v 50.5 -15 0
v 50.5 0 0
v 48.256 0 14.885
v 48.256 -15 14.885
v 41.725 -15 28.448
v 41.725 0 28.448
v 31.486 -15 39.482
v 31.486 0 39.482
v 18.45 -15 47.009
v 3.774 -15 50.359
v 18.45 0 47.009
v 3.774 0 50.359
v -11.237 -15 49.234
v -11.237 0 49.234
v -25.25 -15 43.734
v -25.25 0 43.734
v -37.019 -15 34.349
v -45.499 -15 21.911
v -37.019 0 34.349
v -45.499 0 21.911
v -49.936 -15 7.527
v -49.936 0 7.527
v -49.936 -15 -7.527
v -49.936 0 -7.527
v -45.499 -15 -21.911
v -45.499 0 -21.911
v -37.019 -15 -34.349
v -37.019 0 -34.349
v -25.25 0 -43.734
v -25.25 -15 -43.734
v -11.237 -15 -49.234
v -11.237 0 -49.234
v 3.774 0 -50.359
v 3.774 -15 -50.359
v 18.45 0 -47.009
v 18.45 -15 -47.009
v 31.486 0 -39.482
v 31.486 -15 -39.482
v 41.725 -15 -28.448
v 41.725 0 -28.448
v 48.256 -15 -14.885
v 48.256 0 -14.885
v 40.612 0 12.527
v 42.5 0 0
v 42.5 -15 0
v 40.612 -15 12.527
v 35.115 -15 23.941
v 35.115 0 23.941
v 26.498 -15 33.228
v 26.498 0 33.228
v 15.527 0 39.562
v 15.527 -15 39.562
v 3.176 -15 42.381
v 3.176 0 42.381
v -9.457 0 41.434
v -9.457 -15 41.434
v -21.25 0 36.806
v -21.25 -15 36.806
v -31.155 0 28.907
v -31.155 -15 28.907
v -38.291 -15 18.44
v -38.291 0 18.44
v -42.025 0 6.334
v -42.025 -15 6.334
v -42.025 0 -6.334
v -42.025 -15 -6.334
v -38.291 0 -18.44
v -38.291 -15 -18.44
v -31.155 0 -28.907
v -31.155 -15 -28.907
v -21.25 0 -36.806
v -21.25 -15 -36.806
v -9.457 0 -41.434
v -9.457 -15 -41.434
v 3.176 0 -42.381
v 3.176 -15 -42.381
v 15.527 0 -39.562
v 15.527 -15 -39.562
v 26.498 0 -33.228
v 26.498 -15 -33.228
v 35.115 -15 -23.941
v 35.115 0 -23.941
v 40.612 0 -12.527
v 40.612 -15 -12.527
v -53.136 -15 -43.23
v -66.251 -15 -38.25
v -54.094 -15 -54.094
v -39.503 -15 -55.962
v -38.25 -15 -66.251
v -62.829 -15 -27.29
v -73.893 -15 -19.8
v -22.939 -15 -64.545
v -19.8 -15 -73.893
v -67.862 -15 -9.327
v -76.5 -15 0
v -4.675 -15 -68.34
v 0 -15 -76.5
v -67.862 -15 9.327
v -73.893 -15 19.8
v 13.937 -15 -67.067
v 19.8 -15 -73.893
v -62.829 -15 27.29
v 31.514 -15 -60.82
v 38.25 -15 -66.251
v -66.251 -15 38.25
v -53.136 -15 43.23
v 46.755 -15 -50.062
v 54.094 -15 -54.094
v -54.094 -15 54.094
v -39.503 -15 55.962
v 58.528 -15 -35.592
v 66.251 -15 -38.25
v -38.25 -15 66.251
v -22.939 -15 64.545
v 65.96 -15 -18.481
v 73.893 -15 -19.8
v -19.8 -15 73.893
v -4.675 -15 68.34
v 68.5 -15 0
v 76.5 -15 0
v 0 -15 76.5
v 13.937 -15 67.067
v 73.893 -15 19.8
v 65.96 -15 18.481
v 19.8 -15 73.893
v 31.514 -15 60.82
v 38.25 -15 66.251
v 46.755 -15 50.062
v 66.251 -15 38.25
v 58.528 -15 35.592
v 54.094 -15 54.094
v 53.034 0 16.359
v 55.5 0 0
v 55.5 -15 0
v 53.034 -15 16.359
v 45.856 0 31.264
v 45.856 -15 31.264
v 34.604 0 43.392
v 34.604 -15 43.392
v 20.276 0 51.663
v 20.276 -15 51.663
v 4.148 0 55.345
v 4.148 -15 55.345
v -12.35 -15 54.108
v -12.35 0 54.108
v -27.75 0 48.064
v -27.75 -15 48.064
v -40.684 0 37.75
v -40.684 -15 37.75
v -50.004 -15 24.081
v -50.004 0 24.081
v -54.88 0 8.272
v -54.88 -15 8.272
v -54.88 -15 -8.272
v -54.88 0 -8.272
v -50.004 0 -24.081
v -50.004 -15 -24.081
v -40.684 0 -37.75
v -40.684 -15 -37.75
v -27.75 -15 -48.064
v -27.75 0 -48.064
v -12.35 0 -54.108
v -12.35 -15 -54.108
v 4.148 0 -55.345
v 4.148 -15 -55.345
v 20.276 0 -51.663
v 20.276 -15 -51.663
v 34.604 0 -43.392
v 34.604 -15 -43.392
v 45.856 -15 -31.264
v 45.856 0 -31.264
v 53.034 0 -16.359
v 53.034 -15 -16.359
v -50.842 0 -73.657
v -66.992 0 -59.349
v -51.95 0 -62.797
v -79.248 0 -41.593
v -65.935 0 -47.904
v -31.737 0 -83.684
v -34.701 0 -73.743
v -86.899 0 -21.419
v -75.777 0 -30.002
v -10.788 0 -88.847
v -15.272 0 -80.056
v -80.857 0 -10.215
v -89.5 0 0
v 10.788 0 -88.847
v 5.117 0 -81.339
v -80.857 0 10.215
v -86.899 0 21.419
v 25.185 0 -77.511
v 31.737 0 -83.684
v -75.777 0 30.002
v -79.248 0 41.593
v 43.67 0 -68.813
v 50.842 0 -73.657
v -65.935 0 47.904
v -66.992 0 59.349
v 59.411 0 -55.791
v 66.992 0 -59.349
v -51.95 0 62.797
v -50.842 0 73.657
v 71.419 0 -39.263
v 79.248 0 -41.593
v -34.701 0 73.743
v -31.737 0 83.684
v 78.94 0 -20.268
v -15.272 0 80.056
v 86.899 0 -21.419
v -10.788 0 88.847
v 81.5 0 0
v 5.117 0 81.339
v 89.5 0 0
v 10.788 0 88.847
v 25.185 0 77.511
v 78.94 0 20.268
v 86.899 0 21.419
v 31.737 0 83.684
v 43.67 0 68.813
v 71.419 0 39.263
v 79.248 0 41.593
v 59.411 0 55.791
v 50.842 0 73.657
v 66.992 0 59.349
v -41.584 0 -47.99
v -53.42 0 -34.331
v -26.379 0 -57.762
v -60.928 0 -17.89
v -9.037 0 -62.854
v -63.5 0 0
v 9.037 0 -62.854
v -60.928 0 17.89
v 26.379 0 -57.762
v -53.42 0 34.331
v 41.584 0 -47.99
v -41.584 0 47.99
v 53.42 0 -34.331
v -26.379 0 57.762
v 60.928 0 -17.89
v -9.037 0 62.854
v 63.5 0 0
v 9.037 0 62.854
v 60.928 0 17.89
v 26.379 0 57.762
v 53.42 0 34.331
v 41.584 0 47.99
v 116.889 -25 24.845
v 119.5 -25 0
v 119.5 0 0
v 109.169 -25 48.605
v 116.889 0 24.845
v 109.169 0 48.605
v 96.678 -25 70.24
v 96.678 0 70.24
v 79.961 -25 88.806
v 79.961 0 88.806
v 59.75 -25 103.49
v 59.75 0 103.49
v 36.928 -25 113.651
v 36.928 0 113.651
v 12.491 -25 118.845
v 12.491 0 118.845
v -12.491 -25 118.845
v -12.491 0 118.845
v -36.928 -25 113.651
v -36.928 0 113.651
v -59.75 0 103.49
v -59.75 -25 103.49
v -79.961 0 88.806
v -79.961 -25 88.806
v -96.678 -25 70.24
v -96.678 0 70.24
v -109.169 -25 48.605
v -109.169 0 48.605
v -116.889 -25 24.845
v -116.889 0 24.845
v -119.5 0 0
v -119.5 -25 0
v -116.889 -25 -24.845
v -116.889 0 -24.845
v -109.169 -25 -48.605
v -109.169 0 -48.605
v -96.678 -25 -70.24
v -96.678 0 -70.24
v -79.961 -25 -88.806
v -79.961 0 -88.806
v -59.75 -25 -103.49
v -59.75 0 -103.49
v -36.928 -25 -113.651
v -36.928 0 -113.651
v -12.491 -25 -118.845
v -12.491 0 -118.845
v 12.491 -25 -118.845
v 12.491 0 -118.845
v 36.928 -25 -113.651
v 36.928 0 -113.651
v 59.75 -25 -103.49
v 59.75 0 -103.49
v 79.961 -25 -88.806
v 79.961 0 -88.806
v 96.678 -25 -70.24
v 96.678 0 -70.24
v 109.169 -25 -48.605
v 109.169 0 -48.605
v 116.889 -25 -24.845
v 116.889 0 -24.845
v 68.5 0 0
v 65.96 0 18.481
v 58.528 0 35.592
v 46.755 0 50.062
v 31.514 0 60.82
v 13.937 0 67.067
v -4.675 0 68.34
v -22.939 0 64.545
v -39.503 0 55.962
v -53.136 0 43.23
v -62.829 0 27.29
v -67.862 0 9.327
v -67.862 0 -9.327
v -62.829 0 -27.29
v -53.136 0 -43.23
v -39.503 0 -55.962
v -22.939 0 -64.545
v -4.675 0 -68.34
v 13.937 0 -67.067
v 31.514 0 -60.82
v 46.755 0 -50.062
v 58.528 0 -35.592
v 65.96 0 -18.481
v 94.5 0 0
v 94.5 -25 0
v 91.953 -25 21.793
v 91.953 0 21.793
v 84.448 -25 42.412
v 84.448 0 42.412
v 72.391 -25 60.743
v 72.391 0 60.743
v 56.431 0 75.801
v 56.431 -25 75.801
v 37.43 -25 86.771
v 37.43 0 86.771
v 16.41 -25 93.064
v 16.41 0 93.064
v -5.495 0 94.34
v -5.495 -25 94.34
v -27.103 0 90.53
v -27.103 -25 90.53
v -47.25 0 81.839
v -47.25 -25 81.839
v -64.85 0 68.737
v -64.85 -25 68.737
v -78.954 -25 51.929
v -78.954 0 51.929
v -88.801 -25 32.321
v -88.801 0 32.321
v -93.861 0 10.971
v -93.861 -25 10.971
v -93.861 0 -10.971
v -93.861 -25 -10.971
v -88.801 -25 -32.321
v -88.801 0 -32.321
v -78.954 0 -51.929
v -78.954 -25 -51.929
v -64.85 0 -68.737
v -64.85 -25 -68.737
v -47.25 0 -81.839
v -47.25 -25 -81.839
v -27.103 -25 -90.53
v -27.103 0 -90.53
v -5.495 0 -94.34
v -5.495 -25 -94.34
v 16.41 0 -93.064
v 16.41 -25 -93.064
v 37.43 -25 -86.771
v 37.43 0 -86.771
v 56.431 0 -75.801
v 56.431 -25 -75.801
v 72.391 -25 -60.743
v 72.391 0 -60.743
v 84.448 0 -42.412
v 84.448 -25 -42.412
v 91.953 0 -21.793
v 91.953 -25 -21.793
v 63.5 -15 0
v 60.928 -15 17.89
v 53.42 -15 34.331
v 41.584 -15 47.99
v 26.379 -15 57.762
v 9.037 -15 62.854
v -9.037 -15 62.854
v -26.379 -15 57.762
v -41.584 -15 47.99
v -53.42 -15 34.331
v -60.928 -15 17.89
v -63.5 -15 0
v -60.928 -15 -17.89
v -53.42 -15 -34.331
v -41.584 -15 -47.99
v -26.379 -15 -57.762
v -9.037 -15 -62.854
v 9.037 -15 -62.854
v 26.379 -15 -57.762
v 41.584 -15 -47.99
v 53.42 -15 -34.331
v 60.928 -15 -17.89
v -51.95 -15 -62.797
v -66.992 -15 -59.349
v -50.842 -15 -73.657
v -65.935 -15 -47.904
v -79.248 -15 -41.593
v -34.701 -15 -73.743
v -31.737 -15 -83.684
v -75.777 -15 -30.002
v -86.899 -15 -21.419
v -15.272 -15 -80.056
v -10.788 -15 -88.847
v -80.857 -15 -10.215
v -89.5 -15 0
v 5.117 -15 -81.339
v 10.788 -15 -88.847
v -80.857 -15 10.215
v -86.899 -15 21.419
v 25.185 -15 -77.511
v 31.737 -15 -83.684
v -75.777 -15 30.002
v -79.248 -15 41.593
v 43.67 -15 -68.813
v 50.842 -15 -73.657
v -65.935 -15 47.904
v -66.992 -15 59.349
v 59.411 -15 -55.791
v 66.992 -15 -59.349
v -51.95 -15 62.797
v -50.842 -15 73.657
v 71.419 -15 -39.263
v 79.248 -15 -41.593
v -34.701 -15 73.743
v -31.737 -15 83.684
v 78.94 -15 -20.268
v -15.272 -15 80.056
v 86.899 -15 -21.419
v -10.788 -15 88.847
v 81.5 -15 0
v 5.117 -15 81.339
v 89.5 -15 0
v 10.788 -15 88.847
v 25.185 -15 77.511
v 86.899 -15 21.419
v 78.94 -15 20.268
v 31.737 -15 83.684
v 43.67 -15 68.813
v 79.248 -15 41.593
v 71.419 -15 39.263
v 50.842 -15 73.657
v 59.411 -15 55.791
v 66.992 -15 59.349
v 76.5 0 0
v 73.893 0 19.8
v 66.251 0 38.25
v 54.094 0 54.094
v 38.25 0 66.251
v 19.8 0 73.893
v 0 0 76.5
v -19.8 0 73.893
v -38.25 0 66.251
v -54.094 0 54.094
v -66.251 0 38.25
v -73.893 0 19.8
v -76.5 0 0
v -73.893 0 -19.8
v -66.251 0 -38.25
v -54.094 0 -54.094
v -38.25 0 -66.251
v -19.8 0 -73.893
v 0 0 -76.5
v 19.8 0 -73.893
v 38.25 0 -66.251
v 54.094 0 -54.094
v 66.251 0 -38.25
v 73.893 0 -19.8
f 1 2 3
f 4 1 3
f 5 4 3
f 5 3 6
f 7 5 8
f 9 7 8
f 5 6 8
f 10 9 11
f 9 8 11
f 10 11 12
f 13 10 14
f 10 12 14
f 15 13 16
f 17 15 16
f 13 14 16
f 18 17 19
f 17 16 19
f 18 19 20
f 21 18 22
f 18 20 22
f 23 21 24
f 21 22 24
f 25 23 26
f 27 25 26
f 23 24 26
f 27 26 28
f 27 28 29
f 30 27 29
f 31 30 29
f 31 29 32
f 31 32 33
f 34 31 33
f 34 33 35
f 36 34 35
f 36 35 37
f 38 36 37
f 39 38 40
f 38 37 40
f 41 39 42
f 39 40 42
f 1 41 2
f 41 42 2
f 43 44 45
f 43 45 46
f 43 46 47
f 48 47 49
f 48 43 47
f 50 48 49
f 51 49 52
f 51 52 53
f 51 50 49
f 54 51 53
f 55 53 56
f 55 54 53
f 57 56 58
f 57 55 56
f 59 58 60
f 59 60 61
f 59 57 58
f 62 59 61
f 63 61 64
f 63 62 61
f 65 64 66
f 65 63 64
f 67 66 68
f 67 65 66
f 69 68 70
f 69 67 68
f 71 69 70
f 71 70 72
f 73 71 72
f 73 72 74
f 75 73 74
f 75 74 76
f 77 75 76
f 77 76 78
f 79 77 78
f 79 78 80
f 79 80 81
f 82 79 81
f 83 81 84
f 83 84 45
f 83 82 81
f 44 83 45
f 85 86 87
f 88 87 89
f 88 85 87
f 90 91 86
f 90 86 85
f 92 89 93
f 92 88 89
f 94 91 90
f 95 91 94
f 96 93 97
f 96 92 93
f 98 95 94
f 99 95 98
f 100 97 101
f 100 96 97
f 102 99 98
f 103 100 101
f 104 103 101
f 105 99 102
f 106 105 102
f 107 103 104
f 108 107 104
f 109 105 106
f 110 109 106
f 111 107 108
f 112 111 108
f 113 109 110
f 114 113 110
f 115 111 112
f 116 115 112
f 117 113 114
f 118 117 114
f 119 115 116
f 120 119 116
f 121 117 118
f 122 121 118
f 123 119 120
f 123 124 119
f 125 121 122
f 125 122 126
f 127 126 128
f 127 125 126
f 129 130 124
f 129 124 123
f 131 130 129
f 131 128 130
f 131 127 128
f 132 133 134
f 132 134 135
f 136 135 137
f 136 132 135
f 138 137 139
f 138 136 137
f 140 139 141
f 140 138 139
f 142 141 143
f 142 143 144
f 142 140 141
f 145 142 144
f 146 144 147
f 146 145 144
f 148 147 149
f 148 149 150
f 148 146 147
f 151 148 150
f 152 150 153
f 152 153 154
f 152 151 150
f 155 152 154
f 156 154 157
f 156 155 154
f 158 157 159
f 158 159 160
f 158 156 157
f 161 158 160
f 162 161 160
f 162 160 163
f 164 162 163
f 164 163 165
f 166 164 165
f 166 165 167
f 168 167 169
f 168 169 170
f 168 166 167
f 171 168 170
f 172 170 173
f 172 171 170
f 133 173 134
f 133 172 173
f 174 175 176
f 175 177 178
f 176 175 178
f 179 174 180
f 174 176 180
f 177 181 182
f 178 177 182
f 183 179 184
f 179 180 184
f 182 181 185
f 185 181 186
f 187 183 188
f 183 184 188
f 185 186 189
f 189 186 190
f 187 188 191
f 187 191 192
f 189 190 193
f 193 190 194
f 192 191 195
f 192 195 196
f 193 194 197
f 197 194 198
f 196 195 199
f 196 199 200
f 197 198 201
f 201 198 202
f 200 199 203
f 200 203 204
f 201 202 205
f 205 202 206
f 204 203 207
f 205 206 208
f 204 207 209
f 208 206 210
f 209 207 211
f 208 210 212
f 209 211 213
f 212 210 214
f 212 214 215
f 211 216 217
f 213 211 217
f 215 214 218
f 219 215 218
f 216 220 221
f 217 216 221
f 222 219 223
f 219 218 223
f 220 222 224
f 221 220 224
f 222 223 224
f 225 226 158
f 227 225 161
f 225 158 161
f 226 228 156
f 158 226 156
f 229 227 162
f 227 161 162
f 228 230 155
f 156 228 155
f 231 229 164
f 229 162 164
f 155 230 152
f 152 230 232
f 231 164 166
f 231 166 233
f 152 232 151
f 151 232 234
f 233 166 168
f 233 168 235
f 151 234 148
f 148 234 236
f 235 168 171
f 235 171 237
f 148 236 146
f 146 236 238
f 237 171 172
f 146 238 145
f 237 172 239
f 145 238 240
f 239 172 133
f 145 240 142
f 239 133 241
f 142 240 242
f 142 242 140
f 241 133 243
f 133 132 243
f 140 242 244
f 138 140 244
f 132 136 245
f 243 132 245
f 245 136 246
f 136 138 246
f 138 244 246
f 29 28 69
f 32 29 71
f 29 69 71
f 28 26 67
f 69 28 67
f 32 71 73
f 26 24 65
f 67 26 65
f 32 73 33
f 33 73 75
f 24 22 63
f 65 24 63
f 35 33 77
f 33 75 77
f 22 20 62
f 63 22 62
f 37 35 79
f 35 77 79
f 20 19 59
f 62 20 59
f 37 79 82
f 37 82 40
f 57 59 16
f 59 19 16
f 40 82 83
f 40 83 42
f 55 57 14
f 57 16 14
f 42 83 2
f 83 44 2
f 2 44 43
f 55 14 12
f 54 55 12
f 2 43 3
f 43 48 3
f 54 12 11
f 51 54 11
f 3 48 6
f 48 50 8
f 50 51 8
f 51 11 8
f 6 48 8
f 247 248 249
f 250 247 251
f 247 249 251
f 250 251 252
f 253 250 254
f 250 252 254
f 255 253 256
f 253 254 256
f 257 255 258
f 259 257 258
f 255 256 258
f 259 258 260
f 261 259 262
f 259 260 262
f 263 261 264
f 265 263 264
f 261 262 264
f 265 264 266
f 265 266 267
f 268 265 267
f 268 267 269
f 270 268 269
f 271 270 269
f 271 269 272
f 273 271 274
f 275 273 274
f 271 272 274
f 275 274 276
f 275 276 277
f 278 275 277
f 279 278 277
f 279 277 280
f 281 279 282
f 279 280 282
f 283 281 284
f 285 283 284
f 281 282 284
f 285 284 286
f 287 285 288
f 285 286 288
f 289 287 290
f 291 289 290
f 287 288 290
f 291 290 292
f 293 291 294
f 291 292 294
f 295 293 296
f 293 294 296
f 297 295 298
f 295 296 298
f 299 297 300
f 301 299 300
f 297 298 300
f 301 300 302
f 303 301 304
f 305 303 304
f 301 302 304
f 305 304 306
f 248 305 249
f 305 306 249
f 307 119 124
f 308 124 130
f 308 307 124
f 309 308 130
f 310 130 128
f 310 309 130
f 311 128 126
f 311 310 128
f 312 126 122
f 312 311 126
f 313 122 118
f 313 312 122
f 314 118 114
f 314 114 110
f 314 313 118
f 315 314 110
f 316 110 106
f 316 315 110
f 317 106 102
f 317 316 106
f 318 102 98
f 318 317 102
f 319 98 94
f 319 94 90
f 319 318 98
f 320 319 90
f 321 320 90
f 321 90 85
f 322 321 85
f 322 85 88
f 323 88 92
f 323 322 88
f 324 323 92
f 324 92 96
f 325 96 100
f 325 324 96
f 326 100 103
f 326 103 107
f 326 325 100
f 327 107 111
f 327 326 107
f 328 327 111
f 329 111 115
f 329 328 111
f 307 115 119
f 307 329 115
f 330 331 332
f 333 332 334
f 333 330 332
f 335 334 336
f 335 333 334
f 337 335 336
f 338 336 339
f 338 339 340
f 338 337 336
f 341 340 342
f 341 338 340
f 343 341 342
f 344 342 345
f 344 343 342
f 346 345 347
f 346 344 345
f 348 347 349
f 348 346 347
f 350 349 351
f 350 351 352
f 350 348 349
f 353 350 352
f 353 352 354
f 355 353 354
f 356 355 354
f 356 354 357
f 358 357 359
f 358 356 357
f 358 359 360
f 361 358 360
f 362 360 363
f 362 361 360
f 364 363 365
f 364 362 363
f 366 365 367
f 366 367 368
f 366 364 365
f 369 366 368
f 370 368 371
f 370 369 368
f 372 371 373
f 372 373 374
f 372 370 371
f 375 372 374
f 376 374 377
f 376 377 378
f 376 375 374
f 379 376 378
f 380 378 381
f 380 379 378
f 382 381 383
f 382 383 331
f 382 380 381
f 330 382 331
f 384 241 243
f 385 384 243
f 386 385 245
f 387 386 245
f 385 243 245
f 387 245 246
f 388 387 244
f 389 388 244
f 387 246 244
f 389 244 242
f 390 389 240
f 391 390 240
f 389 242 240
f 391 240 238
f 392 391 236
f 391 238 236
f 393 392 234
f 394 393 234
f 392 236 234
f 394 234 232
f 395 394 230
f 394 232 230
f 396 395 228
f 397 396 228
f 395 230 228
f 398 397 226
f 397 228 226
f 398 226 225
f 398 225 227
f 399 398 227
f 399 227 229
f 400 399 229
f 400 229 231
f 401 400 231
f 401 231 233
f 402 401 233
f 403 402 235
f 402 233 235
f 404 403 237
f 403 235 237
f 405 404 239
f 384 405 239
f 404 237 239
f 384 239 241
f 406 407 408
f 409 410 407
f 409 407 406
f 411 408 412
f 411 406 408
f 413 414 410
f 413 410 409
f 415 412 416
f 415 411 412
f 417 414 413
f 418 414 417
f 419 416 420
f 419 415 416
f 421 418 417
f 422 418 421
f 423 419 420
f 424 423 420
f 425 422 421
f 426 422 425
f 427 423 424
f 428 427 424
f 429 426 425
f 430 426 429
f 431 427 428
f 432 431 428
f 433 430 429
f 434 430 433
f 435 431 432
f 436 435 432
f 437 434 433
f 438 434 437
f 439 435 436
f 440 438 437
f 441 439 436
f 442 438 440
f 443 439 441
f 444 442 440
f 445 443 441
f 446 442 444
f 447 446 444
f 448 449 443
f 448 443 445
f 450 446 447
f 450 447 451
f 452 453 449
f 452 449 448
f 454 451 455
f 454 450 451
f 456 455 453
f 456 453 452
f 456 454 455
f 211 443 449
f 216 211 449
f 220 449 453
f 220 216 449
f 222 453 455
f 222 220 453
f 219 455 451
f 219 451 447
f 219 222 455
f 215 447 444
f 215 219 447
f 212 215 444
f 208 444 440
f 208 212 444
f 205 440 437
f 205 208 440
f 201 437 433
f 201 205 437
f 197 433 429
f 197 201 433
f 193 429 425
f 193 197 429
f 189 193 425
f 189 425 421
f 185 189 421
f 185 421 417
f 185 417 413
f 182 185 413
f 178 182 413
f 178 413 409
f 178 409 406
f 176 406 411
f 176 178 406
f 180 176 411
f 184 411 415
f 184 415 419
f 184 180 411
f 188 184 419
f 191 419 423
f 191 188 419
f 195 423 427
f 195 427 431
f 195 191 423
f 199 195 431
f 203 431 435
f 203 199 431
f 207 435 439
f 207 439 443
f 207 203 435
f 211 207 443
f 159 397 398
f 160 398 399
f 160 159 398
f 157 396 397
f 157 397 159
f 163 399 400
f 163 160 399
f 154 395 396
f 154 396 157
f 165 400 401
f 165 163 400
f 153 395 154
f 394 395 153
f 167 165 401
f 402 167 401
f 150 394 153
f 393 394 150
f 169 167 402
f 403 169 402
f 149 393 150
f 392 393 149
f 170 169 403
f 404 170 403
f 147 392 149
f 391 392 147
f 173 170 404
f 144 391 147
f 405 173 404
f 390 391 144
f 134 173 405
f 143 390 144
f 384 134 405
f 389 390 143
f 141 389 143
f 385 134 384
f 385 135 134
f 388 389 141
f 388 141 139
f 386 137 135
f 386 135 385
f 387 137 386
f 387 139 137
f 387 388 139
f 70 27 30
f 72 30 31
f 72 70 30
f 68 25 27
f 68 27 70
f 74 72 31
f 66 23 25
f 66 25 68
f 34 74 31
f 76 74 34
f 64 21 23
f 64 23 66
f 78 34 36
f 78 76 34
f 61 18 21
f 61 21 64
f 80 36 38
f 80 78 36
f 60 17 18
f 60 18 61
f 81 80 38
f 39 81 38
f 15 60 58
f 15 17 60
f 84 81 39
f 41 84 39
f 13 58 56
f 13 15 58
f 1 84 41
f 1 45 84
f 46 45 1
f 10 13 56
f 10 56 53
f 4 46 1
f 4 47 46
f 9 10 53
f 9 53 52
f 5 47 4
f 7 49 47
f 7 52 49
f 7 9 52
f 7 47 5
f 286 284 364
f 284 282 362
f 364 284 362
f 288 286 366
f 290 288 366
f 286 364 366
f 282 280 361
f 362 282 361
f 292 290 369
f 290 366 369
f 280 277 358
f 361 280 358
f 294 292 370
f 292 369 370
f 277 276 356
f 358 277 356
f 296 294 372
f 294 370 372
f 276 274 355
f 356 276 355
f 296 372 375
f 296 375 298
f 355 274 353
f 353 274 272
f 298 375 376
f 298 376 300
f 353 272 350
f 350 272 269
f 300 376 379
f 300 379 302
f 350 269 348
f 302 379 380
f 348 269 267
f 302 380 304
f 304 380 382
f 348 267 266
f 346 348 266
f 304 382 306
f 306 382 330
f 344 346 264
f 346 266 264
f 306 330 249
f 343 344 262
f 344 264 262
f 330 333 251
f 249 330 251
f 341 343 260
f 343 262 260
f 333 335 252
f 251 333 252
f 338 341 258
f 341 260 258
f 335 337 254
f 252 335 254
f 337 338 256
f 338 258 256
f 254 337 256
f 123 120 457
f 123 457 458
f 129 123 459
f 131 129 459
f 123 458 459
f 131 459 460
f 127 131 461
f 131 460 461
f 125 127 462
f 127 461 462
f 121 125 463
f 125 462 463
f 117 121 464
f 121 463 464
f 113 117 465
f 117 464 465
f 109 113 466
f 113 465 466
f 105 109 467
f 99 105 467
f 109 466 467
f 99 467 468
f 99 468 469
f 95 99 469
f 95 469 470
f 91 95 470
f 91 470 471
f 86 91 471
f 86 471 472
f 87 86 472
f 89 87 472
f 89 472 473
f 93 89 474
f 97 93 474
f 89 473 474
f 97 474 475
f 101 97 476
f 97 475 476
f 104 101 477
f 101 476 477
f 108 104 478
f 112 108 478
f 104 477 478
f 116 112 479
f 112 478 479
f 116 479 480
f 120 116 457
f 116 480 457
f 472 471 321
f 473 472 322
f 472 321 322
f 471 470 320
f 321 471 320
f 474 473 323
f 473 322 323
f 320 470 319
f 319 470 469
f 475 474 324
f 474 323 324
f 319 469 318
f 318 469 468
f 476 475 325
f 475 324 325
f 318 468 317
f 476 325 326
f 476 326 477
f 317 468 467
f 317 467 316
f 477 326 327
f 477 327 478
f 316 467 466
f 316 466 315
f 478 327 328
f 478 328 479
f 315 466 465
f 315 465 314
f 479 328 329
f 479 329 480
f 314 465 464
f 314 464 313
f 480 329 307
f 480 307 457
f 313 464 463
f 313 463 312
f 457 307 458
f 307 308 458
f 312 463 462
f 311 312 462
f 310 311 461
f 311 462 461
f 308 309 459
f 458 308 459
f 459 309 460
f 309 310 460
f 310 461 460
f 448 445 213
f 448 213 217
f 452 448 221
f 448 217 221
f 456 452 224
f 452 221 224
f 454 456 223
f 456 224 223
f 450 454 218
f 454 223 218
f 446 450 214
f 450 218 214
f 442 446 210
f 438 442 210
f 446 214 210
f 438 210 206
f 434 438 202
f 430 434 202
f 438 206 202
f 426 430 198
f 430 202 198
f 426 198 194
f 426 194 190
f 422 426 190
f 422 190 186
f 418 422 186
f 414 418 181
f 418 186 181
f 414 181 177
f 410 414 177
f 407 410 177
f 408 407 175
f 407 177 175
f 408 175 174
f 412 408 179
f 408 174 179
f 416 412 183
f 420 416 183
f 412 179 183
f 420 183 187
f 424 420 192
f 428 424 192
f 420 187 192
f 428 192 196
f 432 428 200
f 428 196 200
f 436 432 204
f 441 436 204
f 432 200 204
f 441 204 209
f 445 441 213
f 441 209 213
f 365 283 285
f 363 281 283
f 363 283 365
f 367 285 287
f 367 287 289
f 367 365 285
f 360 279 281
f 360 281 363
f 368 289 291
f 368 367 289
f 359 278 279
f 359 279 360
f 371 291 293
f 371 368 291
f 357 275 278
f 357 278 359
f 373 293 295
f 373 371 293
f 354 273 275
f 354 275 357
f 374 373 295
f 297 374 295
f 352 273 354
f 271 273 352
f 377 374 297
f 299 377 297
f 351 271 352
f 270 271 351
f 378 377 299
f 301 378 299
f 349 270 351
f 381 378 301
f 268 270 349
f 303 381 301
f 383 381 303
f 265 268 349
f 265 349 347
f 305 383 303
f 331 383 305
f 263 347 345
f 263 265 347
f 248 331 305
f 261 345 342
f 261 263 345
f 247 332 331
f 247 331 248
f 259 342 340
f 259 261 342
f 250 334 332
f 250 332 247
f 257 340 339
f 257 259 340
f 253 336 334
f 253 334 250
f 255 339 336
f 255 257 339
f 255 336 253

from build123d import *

# Parameters (mm, degrees)
F0_R     = 50.5
F0_R_2   = 42.5
F1_DEPTH = 15
F2_R     = 63.5
F2_R_2   = 55.5
F3_DEPTH = 15
F4_R     = 76.5
F4_R_2   = 68.5
F5_DEPTH = 15
F6_R     = 89.5
F6_R_2   = 81.5
F7_DEPTH = 15
F8_R     = 119.5
F8_R_2   = 94.5
F9_DEPTH = 25


with BuildPart() as f1:
    # F0 (on Front) → F1 (new body)
    with BuildSketch(Plane.XZ):
        Circle(F0_R)
        Circle(F0_R_2, mode=Mode.SUBTRACT)
    extrude(amount=F1_DEPTH)


with BuildPart() as f3:
    # F2 (on Front) → F3 (new body)
    with BuildSketch(Plane.XZ):
        Circle(F2_R)
        Circle(F2_R_2, mode=Mode.SUBTRACT)
    extrude(amount=F3_DEPTH)


with BuildPart() as f5:
    # F4 (on Front) → F5 (new body)
    with BuildSketch(Plane.XZ):
        Circle(F4_R)
        Circle(F4_R_2, mode=Mode.SUBTRACT)
    extrude(amount=F5_DEPTH)


with BuildPart() as f7:
    # F6 (on Front) → F7 (new body)
    with BuildSketch(Plane.XZ):
        Circle(F6_R)
        Circle(F6_R_2, mode=Mode.SUBTRACT)
    extrude(amount=F7_DEPTH)


with BuildPart() as f9:
    # F8 (on Front) → F9 (new body)
    with BuildSketch(Plane.XZ):
        Circle(F8_R)
        Circle(F8_R_2, mode=Mode.SUBTRACT)
    extrude(amount=F9_DEPTH)


solid = Compound([f1.part, f3.part, f5.part, f7.part, f9.part])
